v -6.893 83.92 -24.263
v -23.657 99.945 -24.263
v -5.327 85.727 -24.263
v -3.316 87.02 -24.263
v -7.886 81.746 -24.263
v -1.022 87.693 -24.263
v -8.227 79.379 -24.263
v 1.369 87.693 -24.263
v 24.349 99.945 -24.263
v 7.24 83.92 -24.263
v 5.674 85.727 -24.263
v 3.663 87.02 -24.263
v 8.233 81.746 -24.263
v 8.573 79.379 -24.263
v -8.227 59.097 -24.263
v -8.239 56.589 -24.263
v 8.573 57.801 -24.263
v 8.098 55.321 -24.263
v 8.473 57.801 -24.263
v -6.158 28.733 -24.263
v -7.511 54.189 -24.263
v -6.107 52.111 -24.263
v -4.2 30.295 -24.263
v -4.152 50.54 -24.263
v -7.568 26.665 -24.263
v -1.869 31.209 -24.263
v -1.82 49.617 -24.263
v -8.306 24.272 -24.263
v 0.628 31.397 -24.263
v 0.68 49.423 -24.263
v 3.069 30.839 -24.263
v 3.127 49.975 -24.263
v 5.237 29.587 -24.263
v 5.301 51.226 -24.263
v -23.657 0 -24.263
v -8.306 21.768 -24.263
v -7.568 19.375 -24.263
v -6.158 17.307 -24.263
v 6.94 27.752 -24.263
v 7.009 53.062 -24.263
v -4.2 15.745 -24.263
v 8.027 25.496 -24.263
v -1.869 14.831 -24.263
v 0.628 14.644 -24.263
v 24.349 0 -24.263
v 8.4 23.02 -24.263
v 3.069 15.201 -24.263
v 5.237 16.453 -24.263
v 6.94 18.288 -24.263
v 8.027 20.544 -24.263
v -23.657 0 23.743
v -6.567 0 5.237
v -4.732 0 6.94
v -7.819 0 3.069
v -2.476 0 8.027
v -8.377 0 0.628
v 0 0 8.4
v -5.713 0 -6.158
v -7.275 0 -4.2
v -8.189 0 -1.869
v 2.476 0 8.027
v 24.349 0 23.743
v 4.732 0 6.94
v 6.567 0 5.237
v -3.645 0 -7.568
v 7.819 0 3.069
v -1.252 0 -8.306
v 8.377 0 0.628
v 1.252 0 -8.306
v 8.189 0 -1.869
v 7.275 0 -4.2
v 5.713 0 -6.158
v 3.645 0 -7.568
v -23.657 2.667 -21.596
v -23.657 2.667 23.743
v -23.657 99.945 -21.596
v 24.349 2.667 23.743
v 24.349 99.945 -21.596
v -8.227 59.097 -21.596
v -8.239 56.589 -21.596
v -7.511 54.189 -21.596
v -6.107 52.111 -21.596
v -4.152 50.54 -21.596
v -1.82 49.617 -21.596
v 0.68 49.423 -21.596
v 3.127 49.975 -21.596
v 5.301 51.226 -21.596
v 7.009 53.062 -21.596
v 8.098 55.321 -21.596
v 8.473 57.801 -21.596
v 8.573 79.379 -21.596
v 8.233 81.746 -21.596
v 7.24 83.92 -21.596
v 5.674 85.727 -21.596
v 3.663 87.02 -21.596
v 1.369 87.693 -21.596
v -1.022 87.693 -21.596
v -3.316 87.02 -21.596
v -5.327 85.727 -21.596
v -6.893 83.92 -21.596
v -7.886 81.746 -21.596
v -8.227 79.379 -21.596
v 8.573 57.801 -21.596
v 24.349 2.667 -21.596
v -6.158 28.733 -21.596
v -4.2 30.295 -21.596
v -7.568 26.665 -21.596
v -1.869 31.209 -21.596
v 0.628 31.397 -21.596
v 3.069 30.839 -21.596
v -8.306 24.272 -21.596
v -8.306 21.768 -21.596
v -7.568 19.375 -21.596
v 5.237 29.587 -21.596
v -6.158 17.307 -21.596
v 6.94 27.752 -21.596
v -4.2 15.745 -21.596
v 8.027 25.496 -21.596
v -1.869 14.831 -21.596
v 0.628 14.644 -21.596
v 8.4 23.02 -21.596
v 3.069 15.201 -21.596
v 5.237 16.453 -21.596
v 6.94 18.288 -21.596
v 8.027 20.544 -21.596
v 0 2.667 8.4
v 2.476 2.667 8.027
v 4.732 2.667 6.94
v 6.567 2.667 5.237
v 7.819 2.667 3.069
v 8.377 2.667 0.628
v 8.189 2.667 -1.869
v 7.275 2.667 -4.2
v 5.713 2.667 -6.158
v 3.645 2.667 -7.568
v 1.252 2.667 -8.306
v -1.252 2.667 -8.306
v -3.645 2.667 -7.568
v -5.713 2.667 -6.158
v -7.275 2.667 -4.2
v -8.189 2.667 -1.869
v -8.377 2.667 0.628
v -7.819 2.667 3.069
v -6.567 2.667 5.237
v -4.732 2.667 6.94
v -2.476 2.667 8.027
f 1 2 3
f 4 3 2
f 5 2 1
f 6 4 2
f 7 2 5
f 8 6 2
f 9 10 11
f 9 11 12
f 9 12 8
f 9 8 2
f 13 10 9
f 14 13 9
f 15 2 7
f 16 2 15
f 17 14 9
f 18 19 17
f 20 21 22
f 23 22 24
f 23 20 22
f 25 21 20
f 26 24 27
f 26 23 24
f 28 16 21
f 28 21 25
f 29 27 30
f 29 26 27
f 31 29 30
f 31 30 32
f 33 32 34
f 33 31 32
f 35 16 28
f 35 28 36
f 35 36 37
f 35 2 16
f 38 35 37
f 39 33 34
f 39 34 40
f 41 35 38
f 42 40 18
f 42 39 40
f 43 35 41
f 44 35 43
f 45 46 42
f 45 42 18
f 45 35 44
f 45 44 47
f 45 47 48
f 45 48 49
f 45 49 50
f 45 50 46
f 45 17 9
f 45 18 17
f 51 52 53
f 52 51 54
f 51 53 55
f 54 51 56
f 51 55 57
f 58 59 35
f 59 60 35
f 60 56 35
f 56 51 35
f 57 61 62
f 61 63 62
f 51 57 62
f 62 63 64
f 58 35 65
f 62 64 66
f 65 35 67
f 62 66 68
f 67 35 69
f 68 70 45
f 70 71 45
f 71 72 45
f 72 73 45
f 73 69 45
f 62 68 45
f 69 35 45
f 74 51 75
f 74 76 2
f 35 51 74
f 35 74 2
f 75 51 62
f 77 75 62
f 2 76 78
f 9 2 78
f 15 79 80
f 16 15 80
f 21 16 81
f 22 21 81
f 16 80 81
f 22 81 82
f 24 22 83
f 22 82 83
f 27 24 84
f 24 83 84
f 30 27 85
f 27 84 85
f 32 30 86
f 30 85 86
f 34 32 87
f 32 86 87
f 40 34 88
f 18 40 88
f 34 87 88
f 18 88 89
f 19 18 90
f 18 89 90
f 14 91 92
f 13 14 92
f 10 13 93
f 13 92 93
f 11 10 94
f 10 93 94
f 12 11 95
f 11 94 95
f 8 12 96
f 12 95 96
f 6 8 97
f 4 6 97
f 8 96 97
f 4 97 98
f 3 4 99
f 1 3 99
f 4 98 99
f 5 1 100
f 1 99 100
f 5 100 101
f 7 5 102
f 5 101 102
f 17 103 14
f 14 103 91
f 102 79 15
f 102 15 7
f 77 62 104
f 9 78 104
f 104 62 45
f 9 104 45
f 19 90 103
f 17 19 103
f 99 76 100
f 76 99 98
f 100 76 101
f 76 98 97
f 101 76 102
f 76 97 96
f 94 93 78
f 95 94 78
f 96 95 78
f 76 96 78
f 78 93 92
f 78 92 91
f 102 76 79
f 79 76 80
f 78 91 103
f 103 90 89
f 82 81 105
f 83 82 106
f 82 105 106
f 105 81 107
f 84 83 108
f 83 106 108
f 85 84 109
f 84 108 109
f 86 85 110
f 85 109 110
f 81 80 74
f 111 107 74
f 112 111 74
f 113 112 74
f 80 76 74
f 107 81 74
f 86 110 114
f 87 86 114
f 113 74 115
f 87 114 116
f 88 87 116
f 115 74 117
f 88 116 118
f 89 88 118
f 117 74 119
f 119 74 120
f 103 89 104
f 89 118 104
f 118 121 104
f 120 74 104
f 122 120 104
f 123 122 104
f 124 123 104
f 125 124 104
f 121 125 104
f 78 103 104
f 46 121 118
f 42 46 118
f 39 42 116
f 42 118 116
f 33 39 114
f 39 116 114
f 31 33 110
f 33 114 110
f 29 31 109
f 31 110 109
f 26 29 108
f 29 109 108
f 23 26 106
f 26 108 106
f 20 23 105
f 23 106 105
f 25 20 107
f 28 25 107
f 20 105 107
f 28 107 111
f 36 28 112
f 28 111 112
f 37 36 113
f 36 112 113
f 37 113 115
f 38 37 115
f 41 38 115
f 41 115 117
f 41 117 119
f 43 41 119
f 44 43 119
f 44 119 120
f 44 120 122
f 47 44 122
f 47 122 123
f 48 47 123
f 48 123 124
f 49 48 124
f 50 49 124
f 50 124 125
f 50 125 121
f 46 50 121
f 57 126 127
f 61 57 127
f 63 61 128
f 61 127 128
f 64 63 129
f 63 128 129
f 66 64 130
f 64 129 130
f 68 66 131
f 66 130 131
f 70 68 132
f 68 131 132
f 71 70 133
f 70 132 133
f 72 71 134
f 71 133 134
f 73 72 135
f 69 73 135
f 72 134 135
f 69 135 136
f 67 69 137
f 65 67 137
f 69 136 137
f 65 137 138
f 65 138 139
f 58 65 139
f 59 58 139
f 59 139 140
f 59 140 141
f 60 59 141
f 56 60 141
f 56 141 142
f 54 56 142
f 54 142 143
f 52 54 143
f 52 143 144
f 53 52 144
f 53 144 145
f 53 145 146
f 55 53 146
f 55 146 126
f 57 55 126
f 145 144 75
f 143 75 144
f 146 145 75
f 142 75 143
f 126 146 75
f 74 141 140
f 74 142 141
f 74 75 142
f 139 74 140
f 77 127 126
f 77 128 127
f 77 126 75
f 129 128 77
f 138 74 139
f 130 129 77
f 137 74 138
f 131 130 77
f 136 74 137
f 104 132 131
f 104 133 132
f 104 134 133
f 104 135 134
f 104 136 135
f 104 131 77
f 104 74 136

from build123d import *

# Parameters (mm, degrees)
SKETCH1_W           = 22.86
SKETCH1_H           = 22.86
BOSS_EXTRUDE1_DEPTH = 1.27
SKETCH3_W           = 22.86
SKETCH3_H           = 1.27
BOSS_EXTRUDE2_DEPTH = 47.593039283
SKETCH4_R           = 4
CUT_EXTRUDE2_DEPTH  = 10
SKETCH5_R           = 4
SKETCH5_W           = 8
SKETCH5_H           = 10.275395712
CUT_EXTRUDE3_DEPTH  = 2.54
SCALE2_SCALE        = 2.1


with BuildPart() as part:
    # Sketch1 → Boss-Extrude1 (new body)
    with BuildSketch(Plane(origin=(0, 0, 0), x_dir=(1, 0, 0), z_dir=(0, 1, 0))):
        with Locations((0.164586144, 0.124003255)):
            Rectangle(SKETCH1_W, SKETCH1_H)
    extrude(amount=BOSS_EXTRUDE1_DEPTH)

    # Sketch3 → Boss-Extrude2 (add)
    with BuildSketch(Plane.XZ):
        with Locations((0.164586144, -10.919003255)):
            Rectangle(SKETCH3_W, SKETCH3_H)
    extrude(amount=-BOSS_EXTRUDE2_DEPTH)

    # Sketch4 → Cut-Extrude2 (cut)
    with BuildSketch(Plane(origin=(0, 1.27, 0), x_dir=(1, 0, 0), z_dir=(0, 1, 0))):
        with Locations(Location((0, 0, 0), (0, 0, 270))):
            Circle(SKETCH4_R)
    extrude(amount=-CUT_EXTRUDE2_DEPTH, mode=Mode.SUBTRACT)

    # Sketch5 → Cut-Extrude3 (cut)
    with BuildSketch(Plane.XY.offset(-10.284003255)):
        with Locations((0.082545716, 37.799520725)):
            Circle(SKETCH5_R)
        with Locations((0.034649226, 27.524125013)):
            Circle(SKETCH5_R)
        with Locations((0.082545716, 32.661822869)):
            Rectangle(SKETCH5_W, SKETCH5_H)
        with BuildLine():
            ThreePointArc((4.034649226, 27.524125013), (0.344153636, 31.512132914), (-3.917454284, 28.141278028))
            Line((-3.917454284, 28.141278028), (-3.917454284, 27.524125013))
            Line((-3.917454284, 27.524125013), (4.034649226, 27.524125013))
        make_face()
        with BuildLine():
            Line((-3.917454284, 27.524125013), (-3.917454284, 28.141278028))
            ThreePointArc((-3.917454284, 28.141278028), (-0.274855184, 23.536117112), (4.034649226, 27.524125013))
            Line((4.034649226, 27.524125013), (-3.917454284, 27.524125013))
        make_face()
        with Locations((0, 10.961912138)):
            Circle(SKETCH5_R)
        with BuildLine():
            ThreePointArc((4.082545716, 37.799520725), (0.082545716, 41.799520725), (-3.917454284, 37.799520725))
            Line((-3.917454284, 37.799520725), (4.082545716, 37.799520725))
        make_face()
        with BuildLine():
            Line((4.082545716, 37.799520725), (-3.917454284, 37.799520725))
            ThreePointArc((-3.917454284, 37.799520725), (0.082545716, 33.799520725), (4.082545716, 37.799520725))
        make_face()
    extrude(amount=-CUT_EXTRUDE3_DEPTH, mode=Mode.SUBTRACT)


with BuildPart() as part_1:
    # Scale2: scaled about (0, 0, 0)
    add(part.part.scale(SCALE2_SCALE))


solid = part_1.part
